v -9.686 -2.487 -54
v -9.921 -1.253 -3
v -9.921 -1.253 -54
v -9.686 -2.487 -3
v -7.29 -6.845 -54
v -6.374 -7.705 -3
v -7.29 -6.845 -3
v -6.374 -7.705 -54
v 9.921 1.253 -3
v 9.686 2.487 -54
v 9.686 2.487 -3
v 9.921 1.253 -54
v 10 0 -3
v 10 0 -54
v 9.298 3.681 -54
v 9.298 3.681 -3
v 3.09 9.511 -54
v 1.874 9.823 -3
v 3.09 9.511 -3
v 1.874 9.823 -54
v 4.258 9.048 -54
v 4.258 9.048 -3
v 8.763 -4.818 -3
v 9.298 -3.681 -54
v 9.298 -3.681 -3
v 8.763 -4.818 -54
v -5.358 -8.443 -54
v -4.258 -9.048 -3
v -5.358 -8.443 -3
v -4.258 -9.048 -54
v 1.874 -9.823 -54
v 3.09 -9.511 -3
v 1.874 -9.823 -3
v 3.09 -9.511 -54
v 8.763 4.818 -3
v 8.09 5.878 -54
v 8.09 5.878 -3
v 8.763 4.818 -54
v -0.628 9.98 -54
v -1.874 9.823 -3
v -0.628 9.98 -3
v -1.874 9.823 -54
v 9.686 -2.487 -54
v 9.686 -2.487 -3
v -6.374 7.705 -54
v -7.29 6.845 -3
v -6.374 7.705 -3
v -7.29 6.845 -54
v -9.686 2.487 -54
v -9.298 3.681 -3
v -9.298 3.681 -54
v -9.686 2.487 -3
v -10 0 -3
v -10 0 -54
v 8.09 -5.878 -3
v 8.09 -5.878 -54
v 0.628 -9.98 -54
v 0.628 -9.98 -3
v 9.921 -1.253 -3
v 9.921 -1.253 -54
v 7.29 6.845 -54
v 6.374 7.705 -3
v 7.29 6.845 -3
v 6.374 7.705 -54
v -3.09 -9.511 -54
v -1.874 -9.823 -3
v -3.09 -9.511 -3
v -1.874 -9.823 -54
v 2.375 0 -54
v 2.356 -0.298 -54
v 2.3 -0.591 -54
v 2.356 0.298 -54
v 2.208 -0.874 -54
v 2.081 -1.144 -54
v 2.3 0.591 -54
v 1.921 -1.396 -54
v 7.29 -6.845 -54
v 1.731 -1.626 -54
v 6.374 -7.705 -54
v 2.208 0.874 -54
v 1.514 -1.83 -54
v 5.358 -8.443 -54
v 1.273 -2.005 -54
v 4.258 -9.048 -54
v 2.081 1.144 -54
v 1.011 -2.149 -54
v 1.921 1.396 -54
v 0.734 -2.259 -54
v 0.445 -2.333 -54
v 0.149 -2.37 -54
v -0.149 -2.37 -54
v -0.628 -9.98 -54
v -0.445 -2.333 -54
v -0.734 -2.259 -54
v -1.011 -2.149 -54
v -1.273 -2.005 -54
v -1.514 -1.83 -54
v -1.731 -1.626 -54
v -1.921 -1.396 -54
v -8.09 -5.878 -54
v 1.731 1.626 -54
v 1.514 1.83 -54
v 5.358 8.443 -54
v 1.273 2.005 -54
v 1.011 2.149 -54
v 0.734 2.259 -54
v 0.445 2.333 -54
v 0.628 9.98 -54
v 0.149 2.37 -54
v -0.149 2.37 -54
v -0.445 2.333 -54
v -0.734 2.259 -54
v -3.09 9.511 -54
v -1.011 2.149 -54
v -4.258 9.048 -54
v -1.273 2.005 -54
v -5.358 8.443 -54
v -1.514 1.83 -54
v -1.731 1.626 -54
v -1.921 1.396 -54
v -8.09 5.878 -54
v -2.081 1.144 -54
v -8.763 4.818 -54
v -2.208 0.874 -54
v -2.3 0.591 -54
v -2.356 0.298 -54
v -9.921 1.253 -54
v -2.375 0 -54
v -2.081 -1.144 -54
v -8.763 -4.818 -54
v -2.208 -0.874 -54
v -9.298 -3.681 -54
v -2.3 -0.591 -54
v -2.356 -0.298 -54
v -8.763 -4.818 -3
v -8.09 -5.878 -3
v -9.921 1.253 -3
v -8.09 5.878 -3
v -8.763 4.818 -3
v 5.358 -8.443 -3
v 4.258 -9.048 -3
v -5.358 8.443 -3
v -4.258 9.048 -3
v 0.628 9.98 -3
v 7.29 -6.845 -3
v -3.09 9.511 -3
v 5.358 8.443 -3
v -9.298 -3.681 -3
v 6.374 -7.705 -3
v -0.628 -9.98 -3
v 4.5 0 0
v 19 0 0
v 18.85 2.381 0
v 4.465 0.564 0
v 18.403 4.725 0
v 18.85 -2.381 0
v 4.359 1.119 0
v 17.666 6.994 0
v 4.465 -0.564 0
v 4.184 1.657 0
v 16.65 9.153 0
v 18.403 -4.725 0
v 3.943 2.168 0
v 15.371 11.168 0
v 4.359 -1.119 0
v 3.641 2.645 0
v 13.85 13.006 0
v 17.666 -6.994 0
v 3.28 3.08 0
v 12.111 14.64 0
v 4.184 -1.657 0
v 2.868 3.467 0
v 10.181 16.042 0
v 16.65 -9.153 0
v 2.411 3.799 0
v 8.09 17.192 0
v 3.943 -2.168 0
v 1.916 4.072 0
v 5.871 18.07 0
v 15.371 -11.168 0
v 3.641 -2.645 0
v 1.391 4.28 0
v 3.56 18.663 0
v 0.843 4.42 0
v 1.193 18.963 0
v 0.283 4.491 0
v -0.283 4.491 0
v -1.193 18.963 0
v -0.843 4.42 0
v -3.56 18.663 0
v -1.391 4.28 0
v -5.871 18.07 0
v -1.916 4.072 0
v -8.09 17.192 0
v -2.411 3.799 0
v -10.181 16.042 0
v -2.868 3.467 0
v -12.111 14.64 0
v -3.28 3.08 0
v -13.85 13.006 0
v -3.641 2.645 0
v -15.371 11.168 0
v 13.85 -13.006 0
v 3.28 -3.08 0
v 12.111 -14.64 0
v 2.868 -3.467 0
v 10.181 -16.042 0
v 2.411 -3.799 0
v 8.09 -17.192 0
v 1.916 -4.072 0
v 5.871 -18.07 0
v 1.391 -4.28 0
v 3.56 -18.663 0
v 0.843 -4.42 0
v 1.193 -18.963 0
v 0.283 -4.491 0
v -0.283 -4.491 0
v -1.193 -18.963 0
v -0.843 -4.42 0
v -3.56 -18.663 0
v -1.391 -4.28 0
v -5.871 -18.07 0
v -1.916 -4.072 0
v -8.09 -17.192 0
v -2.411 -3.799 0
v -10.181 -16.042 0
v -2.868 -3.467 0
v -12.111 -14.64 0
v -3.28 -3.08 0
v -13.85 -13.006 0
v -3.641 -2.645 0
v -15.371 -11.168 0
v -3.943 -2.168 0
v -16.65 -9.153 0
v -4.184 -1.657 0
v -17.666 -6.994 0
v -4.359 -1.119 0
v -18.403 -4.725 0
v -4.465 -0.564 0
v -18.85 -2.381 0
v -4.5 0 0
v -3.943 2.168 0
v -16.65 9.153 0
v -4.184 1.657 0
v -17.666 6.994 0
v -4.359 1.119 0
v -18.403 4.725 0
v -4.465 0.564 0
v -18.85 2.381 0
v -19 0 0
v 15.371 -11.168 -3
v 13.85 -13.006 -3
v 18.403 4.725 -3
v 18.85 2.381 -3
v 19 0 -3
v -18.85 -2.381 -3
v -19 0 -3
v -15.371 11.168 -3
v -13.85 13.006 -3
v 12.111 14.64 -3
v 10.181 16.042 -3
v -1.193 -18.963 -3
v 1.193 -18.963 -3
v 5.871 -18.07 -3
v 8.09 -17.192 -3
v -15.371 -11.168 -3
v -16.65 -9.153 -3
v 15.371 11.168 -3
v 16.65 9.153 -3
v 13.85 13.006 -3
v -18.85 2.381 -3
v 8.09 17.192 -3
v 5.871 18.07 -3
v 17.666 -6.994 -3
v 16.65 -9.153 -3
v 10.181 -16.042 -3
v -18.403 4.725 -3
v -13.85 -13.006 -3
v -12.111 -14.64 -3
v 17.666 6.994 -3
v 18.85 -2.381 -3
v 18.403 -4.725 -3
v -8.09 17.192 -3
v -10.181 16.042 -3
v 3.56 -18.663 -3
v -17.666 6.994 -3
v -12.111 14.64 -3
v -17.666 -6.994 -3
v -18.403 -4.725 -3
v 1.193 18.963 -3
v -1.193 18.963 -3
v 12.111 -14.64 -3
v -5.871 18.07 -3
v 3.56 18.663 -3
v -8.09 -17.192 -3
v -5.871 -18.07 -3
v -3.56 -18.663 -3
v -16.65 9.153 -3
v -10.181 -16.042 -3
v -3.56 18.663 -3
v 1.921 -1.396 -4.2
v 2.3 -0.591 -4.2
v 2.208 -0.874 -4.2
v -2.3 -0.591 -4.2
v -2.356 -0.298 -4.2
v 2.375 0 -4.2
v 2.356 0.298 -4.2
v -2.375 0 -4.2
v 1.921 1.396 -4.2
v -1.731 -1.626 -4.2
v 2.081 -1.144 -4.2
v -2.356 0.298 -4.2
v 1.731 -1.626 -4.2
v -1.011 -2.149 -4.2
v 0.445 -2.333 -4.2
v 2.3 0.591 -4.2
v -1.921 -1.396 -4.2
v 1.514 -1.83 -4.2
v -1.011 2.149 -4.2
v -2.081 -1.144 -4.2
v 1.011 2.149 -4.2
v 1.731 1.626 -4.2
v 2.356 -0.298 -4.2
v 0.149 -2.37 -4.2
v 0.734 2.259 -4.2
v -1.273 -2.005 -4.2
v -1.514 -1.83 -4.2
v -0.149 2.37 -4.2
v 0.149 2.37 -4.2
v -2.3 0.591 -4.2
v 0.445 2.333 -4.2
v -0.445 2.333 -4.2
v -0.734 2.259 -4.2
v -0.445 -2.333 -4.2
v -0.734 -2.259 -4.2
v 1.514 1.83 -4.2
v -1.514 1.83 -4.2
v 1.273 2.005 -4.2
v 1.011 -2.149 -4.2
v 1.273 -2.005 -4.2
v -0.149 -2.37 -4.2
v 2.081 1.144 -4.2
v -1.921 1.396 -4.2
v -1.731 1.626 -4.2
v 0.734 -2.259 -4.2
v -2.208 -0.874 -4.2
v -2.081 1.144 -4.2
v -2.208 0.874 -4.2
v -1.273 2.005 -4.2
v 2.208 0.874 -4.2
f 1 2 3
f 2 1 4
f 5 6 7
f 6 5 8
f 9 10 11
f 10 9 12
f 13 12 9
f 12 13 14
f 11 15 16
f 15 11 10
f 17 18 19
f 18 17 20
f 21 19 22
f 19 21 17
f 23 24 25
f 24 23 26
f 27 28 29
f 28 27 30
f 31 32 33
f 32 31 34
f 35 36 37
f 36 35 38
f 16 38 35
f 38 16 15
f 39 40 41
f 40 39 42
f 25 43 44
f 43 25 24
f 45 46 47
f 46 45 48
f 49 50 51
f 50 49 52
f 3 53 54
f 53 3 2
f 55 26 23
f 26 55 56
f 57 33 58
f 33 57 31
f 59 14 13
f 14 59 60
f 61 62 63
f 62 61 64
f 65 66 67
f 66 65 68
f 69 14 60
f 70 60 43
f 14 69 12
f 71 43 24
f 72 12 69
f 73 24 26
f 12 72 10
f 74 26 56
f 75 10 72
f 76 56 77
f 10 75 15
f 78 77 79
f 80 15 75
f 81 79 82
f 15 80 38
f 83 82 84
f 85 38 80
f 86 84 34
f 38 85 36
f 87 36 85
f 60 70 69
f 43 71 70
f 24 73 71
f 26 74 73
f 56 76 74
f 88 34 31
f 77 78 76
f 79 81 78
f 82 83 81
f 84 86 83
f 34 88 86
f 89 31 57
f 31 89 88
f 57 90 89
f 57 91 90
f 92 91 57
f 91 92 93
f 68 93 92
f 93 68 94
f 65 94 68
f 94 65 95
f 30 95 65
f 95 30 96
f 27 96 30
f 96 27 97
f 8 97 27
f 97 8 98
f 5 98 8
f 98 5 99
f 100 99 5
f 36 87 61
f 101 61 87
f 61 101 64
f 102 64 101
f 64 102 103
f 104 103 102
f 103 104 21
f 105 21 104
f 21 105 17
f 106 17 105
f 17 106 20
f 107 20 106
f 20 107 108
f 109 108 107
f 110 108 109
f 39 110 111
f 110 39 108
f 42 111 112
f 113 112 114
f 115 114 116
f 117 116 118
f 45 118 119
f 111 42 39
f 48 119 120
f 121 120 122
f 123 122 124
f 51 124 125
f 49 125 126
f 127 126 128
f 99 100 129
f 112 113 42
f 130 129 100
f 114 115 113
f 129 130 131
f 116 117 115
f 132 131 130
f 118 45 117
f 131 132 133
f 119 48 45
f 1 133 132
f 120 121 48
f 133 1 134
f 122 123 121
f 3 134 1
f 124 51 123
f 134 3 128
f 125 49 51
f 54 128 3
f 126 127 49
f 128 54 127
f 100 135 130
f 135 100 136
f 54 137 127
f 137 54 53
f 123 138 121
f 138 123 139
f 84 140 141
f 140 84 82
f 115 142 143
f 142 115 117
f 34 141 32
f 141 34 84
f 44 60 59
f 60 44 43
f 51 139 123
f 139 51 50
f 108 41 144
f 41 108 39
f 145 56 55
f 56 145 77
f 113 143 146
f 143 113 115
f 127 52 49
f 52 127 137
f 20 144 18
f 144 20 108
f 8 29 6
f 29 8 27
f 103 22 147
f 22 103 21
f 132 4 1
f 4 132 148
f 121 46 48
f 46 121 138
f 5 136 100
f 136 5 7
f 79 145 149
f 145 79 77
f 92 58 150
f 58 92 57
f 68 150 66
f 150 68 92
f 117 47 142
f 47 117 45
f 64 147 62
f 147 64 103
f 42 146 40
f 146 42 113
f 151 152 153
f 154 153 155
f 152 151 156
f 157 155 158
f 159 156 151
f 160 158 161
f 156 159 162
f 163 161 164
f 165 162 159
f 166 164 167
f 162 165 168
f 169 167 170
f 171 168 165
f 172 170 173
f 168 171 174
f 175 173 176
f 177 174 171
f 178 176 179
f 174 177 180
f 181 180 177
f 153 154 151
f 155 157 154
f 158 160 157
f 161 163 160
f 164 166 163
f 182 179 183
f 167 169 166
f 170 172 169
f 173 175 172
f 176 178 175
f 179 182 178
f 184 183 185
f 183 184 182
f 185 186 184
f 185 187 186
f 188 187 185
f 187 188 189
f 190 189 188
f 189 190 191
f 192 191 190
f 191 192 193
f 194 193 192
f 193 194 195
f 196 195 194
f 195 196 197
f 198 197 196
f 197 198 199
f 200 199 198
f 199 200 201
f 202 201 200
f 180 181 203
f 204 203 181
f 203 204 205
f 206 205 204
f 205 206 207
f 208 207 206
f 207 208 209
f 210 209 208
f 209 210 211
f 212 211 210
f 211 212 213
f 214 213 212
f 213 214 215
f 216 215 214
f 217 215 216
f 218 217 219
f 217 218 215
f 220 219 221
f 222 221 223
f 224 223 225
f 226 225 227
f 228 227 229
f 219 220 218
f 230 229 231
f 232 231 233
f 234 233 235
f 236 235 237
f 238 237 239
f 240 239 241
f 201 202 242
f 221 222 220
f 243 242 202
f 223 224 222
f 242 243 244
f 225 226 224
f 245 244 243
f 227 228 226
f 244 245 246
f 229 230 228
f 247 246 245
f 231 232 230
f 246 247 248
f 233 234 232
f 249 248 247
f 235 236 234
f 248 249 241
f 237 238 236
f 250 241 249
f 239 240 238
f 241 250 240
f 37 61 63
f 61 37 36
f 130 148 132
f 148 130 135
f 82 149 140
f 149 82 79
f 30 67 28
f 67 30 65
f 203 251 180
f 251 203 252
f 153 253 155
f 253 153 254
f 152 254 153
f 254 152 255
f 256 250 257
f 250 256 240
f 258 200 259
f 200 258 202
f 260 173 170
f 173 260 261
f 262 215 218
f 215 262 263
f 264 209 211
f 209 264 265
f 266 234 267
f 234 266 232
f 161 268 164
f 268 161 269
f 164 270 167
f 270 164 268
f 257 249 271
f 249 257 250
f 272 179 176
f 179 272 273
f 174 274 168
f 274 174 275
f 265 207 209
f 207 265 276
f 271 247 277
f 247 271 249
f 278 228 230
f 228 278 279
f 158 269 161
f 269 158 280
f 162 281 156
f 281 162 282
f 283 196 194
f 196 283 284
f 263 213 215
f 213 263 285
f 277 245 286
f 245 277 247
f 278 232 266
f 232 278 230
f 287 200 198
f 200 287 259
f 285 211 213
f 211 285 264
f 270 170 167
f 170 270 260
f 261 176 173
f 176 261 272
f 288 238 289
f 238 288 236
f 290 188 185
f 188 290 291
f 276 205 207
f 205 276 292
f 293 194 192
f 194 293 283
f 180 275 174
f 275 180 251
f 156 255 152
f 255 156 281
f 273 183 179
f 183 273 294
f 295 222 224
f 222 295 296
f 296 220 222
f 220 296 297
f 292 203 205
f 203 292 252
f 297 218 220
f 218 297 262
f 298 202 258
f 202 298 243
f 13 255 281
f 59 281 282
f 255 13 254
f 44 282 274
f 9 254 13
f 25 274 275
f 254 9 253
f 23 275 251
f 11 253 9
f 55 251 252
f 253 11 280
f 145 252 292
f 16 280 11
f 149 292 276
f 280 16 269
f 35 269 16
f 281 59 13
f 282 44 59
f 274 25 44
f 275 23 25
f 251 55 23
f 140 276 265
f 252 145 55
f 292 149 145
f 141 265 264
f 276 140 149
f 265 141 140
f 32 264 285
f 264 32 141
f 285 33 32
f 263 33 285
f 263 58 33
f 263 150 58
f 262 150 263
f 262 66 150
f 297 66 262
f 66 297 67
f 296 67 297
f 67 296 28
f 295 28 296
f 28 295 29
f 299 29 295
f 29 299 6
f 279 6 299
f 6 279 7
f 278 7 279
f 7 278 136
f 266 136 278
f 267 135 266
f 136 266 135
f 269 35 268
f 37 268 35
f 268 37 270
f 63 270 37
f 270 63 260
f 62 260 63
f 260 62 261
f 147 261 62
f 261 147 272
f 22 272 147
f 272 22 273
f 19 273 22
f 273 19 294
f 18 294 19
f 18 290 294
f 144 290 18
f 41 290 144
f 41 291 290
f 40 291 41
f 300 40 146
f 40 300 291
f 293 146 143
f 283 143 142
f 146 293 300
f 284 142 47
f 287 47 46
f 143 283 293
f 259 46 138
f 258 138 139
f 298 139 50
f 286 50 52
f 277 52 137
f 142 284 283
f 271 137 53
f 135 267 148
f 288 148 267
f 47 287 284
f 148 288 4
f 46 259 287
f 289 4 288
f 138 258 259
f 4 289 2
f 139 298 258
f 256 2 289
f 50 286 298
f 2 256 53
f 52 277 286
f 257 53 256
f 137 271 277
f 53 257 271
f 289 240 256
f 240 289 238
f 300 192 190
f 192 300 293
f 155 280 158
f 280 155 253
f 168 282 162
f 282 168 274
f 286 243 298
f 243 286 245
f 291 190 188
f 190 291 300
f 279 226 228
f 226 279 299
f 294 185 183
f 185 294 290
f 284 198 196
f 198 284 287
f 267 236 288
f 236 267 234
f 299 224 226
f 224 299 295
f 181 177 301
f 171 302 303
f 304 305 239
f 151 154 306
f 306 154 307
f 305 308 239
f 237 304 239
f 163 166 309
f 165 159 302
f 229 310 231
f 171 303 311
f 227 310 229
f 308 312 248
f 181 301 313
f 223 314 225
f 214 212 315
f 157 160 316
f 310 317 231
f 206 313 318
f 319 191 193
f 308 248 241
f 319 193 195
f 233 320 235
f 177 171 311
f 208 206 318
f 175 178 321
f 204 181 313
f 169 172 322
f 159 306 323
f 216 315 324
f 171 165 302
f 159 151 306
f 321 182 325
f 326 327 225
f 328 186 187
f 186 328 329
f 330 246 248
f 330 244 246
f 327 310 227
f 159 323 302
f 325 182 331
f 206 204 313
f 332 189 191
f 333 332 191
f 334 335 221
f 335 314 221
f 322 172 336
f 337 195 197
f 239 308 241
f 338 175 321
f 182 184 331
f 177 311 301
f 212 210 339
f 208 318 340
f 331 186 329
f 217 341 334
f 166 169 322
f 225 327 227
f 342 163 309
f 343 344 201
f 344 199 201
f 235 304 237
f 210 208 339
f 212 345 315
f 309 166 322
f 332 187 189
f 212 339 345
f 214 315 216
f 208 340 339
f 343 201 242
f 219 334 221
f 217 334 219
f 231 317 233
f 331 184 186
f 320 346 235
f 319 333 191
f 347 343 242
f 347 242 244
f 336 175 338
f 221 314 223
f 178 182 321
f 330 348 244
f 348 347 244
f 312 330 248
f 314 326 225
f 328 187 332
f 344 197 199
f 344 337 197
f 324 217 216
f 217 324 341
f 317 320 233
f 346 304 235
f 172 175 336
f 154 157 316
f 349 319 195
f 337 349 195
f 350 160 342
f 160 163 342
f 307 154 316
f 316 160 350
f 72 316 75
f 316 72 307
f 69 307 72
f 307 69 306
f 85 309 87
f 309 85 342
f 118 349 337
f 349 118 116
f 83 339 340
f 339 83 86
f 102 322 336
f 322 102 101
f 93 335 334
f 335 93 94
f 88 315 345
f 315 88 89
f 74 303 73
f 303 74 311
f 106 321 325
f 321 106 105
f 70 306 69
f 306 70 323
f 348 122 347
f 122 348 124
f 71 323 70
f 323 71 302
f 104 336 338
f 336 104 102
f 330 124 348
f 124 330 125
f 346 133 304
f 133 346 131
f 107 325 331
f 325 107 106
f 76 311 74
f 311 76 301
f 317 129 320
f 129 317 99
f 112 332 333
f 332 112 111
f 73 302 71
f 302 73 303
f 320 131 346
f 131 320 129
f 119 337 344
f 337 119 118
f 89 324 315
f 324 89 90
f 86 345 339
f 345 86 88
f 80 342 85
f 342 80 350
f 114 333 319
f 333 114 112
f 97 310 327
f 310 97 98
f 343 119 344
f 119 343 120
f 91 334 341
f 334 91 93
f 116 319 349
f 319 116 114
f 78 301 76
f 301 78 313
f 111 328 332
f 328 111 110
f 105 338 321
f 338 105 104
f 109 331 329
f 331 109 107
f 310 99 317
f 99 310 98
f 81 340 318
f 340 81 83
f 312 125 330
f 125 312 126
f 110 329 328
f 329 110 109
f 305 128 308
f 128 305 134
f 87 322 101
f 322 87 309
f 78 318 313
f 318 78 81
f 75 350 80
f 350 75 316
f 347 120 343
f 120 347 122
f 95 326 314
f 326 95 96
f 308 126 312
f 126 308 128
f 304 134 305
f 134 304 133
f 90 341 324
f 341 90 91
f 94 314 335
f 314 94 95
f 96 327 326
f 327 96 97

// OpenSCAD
$fn = 50;


difference() {
	union() {
		translate(v = [0, 0, -54.0000000000]) {
			cylinder(h = 54, r = 10.0000000000);
		}
		translate(v = [0, 0, -3.0000000000]) {
			cylinder(h = 3, r = 19.0000000000);
		}
	}
	union() {
		translate(v = [0, 0, 0]) {
			rotate(a = [0, 0, 0]) {
				difference() {
					union() {
						#translate(v = [0, 0, -54.0000000000]) {
							cylinder(h = 54, r = 2.2500000000);
						}
						#translate(v = [0, 0, -4.2000000000]) {
							cylinder(h = 4.2000000000, r = 10.0000000000, r1 = 2.3750000000, r2 = 4.5000000000);
						}
						#translate(v = [0, 0, -54.0000000000]) {
							cylinder(h = 54, r = 2.3750000000);
						}
						#translate(v = [0, 0, -54.0000000000]) {
							cylinder(h = 54, r = 2.2500000000);
						}
					}
					union();
				}
			}
		}
	}
}
